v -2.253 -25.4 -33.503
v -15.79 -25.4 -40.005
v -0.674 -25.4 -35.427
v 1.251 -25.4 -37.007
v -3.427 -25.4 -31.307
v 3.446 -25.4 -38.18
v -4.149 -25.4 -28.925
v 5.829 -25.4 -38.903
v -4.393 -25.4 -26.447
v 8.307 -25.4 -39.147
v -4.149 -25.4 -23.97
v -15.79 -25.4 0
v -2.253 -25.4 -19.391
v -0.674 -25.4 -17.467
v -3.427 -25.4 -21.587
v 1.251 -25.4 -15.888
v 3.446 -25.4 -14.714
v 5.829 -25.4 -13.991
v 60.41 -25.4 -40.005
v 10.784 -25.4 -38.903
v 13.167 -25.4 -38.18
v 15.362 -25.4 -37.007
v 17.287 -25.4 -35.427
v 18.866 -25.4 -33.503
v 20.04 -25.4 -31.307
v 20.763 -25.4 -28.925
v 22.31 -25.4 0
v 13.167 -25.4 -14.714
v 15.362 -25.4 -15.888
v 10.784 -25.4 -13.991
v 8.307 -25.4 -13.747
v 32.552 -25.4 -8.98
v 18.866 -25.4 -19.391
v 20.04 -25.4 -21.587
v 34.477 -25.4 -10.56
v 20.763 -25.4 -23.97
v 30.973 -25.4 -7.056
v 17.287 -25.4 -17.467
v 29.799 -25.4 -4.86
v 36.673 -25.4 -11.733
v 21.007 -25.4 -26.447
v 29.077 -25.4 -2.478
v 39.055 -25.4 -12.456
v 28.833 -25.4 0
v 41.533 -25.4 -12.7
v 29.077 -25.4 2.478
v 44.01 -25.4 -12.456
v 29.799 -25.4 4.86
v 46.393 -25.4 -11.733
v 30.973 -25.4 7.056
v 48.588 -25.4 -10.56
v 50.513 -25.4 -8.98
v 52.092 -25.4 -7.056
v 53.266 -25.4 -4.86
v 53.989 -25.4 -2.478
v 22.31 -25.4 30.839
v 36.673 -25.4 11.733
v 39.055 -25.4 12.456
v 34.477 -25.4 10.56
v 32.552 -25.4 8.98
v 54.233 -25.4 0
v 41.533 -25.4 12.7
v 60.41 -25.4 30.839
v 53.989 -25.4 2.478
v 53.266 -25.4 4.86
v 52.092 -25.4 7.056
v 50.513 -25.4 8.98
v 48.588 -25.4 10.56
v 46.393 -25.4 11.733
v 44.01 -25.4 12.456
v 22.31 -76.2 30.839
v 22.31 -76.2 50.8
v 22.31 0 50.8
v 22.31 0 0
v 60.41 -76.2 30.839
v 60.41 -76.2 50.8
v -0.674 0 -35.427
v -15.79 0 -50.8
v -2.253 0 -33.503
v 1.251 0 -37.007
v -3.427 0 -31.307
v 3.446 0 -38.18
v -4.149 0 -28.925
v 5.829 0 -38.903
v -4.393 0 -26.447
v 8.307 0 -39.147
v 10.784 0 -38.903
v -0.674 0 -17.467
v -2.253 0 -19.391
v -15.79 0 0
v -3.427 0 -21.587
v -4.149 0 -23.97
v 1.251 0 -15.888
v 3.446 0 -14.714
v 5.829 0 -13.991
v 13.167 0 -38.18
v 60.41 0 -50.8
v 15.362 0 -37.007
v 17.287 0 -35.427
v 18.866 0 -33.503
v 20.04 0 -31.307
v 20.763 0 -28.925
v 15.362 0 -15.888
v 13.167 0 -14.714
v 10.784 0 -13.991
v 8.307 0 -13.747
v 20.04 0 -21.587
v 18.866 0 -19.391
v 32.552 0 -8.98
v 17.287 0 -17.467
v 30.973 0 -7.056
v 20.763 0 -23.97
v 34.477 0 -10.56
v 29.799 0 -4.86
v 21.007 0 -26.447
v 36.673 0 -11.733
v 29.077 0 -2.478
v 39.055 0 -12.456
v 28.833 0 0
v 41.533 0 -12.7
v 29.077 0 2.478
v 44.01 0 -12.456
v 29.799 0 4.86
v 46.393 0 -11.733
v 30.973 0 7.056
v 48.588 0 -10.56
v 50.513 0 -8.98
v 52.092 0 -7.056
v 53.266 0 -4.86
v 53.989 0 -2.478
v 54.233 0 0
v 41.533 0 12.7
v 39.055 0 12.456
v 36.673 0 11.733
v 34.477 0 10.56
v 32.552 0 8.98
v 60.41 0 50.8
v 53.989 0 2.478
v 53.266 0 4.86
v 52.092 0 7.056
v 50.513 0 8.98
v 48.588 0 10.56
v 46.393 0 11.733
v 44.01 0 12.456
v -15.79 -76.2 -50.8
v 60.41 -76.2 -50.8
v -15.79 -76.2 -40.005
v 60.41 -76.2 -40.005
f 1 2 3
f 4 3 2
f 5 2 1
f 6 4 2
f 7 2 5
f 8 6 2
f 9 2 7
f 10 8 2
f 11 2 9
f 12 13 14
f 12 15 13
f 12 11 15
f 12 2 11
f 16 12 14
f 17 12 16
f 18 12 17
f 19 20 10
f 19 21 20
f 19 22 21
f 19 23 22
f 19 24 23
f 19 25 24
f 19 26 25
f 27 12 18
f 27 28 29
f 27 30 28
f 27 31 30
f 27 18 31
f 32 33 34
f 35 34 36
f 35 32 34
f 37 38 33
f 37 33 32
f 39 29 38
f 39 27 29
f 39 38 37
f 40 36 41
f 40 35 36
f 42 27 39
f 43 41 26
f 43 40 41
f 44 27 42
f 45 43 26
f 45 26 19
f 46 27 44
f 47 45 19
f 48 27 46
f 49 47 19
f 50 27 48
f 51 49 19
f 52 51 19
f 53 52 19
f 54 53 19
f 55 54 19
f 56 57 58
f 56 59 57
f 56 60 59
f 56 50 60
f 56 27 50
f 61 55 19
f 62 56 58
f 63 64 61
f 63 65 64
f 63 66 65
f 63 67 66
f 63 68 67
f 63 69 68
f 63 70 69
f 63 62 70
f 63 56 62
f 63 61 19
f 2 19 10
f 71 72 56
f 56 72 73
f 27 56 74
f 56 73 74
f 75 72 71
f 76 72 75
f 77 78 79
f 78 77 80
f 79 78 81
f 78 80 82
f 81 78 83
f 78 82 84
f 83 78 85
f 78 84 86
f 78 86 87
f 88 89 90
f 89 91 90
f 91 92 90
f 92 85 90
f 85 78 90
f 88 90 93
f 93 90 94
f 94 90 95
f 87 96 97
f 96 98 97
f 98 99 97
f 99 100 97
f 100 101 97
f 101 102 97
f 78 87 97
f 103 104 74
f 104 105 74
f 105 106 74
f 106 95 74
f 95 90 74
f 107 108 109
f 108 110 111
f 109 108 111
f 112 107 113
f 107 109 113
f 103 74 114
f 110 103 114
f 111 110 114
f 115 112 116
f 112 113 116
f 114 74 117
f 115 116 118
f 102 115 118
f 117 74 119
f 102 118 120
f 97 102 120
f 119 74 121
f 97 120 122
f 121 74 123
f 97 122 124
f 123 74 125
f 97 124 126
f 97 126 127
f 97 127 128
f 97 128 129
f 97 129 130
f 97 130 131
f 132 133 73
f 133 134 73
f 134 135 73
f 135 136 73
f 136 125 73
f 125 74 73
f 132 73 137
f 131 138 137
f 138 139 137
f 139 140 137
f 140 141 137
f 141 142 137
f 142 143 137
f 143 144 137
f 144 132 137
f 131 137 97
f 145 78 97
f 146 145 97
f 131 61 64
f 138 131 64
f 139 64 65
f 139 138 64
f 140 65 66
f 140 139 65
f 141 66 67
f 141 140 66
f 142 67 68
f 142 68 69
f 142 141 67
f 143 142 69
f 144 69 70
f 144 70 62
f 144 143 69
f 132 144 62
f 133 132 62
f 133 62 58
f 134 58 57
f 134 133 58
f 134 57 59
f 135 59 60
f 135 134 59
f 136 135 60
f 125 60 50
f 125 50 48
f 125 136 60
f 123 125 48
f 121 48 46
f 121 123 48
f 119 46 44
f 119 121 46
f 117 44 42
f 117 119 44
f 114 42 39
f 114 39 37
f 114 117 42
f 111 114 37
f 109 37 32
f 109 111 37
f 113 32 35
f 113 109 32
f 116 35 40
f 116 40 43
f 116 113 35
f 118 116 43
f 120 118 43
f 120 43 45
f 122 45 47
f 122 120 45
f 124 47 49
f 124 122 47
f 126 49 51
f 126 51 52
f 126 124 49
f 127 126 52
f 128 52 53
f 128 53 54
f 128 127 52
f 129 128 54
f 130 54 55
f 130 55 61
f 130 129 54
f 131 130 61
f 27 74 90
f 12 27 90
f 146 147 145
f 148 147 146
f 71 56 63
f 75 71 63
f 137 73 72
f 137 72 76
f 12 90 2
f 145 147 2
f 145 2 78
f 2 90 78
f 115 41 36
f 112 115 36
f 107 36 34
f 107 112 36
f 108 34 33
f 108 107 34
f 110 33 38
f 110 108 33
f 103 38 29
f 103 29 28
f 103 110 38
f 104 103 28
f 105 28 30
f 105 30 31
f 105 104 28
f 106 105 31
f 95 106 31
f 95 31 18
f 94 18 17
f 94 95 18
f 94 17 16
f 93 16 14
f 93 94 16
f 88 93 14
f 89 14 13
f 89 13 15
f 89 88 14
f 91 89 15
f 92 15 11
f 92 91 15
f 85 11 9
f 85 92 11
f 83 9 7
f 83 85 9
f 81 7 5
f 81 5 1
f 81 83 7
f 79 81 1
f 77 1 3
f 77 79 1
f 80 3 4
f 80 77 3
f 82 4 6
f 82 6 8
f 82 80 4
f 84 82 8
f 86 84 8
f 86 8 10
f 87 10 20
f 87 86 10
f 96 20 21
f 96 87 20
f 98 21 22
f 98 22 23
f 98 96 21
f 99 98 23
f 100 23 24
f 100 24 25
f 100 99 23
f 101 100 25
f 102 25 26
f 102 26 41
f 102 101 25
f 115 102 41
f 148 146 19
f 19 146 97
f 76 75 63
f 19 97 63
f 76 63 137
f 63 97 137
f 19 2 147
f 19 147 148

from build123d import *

# Parameters (mm, degrees)
F0_R     = 12.7
F1_DEPTH = 25.4
F0_W     = 38.1
F0_H     = 19.960821
F0_W_2   = 76.2
F0_H_2   = 10.794998
F2_DEPTH = 76.2


with BuildPart() as f1:
    # F0 (on Front) → F1 (new body)
    with BuildSketch(Plane.XZ):
        Polygon((60.409845, 30.839179), (22.309845, 30.839179), (22.309845, 0), (-15.790155, 0), (-15.790155, -40.005002), (60.409845, -40.005002), (60.409845, 0), align=None)
        with Locations((8.306528, -26.447218)):
            Circle(F0_R, mode=Mode.SUBTRACT)
        with Locations((41.532636, 0)):
            Circle(F0_R, mode=Mode.SUBTRACT)
    extrude(amount=F1_DEPTH)

    # F0 (on Front) → F2 (join)
    with BuildSketch(Plane.XZ):
        with Locations((41.359845, 40.819589)):
            Rectangle(F0_W, F0_H)
        with Locations((22.309845, -45.402501)):
            Rectangle(F0_W_2, F0_H_2)
    extrude(amount=F2_DEPTH)


solid = f1.part
